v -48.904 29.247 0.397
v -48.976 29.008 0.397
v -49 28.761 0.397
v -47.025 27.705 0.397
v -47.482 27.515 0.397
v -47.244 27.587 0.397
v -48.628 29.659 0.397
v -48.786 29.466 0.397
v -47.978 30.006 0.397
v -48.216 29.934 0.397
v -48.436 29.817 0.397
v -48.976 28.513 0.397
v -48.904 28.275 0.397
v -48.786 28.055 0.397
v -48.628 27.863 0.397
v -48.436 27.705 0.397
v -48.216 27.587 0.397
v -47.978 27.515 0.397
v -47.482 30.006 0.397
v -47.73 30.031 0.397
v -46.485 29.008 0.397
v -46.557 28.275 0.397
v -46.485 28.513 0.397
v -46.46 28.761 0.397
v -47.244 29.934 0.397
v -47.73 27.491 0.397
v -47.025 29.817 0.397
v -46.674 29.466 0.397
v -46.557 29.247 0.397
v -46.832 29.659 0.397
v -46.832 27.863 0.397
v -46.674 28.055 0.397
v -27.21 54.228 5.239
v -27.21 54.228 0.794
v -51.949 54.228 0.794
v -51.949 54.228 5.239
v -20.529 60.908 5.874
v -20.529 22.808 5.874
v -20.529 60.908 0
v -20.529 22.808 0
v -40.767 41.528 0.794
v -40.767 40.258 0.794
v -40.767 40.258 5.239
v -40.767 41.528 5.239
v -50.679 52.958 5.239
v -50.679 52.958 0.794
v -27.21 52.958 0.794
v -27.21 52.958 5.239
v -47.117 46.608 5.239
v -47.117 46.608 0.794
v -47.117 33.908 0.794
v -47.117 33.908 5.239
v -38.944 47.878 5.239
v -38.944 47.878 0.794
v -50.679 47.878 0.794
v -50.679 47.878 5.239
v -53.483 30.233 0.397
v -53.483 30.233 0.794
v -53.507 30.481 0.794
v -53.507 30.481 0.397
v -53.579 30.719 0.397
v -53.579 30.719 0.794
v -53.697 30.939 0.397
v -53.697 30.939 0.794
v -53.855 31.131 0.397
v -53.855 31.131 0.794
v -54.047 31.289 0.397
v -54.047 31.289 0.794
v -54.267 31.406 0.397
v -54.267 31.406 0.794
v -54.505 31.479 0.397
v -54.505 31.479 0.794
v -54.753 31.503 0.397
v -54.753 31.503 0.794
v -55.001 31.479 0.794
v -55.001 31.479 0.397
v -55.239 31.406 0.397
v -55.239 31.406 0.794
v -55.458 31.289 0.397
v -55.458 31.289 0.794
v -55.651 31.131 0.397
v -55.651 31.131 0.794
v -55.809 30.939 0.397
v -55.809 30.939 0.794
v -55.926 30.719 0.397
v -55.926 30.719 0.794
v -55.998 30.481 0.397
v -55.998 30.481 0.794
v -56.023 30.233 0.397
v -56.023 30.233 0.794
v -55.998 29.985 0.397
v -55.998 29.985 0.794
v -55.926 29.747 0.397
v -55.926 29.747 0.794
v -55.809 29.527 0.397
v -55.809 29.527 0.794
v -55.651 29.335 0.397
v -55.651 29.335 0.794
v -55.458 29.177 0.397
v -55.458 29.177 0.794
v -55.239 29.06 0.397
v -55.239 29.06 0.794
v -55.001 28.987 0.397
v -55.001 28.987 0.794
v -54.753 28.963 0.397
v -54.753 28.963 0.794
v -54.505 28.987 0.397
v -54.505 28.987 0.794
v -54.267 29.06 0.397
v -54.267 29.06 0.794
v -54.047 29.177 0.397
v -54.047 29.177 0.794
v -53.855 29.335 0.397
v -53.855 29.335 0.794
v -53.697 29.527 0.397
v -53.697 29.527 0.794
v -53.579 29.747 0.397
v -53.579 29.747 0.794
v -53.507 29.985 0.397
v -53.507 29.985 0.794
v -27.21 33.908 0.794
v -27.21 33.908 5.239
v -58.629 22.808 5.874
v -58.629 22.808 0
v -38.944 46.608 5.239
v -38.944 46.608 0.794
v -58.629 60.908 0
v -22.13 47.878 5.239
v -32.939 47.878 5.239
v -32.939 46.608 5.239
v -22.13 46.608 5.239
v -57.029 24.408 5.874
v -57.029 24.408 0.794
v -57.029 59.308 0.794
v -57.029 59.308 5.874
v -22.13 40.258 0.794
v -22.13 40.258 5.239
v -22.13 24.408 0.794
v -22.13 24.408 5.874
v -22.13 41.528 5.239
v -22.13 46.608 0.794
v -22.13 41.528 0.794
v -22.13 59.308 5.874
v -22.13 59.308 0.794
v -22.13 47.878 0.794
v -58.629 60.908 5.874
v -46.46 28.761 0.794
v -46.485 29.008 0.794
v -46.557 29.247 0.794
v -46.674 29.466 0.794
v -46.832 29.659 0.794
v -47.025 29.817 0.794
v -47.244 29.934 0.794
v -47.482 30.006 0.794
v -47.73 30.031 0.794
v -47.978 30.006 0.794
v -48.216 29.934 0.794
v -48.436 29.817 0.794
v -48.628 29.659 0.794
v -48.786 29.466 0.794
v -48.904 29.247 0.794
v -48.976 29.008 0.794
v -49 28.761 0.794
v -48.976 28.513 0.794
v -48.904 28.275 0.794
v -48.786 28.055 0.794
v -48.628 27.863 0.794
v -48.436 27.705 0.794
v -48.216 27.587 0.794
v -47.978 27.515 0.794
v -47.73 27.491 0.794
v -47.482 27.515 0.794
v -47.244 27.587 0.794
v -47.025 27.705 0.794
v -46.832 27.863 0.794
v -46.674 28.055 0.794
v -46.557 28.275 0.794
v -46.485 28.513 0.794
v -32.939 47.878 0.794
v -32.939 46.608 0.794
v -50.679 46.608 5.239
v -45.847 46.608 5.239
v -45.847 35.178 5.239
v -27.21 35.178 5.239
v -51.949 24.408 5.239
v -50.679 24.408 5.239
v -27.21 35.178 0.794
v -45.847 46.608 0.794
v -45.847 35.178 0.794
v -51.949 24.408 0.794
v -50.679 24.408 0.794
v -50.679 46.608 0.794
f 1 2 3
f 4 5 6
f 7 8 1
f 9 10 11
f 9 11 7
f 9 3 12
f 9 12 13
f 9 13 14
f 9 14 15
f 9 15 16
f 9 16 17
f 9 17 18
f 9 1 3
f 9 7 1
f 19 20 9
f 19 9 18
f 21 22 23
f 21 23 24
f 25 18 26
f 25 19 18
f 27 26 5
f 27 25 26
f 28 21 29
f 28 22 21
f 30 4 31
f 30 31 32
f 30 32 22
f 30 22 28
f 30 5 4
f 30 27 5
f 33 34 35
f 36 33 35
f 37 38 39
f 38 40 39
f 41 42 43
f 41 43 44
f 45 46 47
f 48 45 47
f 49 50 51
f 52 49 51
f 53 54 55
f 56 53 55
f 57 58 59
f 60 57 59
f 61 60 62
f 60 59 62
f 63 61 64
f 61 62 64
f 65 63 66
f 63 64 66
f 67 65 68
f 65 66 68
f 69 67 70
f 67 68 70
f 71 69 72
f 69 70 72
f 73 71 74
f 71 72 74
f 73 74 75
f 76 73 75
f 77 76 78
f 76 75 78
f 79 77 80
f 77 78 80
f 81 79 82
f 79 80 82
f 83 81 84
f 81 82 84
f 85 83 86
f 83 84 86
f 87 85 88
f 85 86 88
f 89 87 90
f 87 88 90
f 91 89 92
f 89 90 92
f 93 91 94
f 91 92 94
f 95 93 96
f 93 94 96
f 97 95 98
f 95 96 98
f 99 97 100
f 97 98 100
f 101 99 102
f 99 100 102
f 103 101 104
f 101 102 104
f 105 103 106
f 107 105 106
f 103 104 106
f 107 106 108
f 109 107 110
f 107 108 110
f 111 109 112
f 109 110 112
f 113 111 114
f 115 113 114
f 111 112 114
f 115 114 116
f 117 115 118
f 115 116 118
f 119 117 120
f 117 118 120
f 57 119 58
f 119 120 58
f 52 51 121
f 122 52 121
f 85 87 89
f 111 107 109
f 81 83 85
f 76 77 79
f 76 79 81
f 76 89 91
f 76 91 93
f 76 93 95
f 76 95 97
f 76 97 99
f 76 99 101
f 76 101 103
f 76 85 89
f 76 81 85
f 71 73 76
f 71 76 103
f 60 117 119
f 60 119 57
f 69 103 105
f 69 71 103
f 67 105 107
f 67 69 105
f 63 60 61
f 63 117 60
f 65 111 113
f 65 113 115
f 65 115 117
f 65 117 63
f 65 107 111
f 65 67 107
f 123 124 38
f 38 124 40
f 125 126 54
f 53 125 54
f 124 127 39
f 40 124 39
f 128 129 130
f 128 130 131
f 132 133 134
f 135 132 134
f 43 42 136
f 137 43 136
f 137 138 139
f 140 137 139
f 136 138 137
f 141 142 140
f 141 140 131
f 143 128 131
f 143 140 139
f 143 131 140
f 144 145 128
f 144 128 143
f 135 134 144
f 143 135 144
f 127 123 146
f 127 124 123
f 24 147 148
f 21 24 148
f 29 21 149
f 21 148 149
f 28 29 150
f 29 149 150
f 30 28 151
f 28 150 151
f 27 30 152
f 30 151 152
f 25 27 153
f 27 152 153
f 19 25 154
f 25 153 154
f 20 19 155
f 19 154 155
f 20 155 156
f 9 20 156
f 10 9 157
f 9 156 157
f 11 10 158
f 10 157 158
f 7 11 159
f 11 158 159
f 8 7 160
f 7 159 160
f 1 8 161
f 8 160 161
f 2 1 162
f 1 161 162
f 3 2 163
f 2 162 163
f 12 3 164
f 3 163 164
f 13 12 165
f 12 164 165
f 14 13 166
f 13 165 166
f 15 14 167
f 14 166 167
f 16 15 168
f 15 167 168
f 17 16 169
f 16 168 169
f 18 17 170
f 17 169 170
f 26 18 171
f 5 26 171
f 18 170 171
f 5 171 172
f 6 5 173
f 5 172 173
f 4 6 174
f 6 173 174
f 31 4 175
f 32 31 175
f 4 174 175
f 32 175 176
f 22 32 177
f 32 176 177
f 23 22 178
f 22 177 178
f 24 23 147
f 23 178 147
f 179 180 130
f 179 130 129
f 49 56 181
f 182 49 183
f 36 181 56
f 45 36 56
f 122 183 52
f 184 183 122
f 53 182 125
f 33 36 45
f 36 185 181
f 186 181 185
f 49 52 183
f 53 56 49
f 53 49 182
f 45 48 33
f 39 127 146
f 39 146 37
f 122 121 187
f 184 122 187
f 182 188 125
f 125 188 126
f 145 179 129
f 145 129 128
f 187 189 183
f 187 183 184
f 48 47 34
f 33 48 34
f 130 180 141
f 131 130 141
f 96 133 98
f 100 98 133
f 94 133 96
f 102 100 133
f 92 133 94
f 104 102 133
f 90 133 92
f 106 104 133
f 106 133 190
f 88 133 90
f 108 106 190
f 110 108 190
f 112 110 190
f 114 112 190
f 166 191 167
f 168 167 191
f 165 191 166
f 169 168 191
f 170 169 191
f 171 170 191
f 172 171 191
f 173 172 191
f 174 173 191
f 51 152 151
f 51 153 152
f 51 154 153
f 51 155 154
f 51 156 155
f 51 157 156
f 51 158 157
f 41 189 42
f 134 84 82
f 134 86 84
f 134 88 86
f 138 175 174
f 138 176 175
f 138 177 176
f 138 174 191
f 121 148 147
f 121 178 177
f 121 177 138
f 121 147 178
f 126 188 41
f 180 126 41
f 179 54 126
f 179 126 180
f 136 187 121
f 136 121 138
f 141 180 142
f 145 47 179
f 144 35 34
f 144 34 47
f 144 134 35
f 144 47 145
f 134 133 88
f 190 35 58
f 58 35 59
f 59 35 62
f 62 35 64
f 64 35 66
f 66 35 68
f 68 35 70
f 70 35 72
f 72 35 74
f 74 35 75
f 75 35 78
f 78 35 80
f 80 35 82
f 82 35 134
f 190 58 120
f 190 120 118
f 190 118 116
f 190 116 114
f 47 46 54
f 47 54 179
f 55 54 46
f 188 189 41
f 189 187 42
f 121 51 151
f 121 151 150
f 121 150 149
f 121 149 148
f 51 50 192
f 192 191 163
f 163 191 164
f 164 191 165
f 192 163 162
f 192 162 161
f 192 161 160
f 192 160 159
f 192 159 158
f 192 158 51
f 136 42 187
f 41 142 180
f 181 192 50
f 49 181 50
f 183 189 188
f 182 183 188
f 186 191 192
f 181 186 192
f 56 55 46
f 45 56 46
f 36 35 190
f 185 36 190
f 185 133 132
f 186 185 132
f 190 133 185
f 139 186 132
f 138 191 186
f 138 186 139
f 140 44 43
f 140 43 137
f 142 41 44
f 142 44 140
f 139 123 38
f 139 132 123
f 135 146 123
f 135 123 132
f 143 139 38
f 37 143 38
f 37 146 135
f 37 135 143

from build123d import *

# Parameters (mm, degrees)
F0_W     = 38.1
F0_H     = 38.1
F1_DEPTH = 0.79375
F2_W     = 38.1
F2_H     = 38.1
F2_W_2   = 34.8996
F2_H_2   = 34.8996
F3_DEPTH = 5.08
F4_W     = 23.4696
F4_H     = 1.27
F4_W_2   = 10.8094774936
F4_W_3   = 18.6369190906
F5_DEPTH = 4.445
F6_R     = 1.27
F7_DEPTH = 0.396875


with BuildPart() as f1:
    # F0 (on Top) → F1 (new body)
    with BuildSketch(Plane.XY):
        with Locations((-39.5794175565, 41.8581605069)):
            Rectangle(F0_W, F0_H)
    extrude(amount=F1_DEPTH)

    # F2 (on face) → F3 (join)
    with BuildSketch(Plane.XY.offset(0.79375)):
        with Locations((-39.5794175565, 41.8581605069)):
            Rectangle(F2_W, F2_H)
        with Locations((-39.5794175565, 41.8581605069)):
            Rectangle(F2_W_2, F2_H_2, mode=Mode.SUBTRACT)
    extrude(amount=F3_DEPTH)

    # F4 (on face) → F5 (join)
    with BuildSketch(Plane.XY.offset(0.79375)):
        Polygon((-51.9492175565, 54.2279605069), (-51.9492175565, 24.4083605069), (-50.6792175565, 24.4083605069), (-50.6792175565, 46.6079605069), (-50.6792175565, 47.8779605069), (-50.6792175565, 52.9579605069), (-50.6792175565, 54.2279605069), align=None)
        Polygon((-50.6792175565, 47.8779605069), (-50.6792175565, 46.6079605069), (-47.1165366471, 46.6079605069), (-45.8465366471, 46.6079605069), (-38.9444175565, 46.6079605069), (-38.9444175565, 47.8779605069), align=None)
        Polygon((-45.8465366471, 46.6079605069), (-47.1165366471, 46.6079605069), (-47.1165366471, 33.9079605069), (-45.8465366471, 33.9079605069), (-45.8465366471, 35.1779605069), align=None)
        with Locations((-38.9444175565, 53.5929605069)):
            Rectangle(F4_W, F4_H)
        with Locations((-27.5343563033, 47.2429605069)):
            Rectangle(F4_W_2, F4_H)
        with Locations((-31.4480771018, 40.8929605069)):
            Rectangle(F4_W_3, F4_H)
        with Locations((-36.5280771018, 34.5429605069)):
            Rectangle(F4_W_3, F4_H)
    extrude(amount=F5_DEPTH)

    # F6 (on face) → F7 (cut)
    with BuildSketch(Plane.XY.offset(0.79375)):
        with Locations((-54.7527819872, 30.2330423146)):
            Circle(F6_R)
        with Locations((-47.7302372456, 28.7605728954)):
            Circle(F6_R)
    extrude(amount=-F7_DEPTH, mode=Mode.SUBTRACT)


solid = f1.part
